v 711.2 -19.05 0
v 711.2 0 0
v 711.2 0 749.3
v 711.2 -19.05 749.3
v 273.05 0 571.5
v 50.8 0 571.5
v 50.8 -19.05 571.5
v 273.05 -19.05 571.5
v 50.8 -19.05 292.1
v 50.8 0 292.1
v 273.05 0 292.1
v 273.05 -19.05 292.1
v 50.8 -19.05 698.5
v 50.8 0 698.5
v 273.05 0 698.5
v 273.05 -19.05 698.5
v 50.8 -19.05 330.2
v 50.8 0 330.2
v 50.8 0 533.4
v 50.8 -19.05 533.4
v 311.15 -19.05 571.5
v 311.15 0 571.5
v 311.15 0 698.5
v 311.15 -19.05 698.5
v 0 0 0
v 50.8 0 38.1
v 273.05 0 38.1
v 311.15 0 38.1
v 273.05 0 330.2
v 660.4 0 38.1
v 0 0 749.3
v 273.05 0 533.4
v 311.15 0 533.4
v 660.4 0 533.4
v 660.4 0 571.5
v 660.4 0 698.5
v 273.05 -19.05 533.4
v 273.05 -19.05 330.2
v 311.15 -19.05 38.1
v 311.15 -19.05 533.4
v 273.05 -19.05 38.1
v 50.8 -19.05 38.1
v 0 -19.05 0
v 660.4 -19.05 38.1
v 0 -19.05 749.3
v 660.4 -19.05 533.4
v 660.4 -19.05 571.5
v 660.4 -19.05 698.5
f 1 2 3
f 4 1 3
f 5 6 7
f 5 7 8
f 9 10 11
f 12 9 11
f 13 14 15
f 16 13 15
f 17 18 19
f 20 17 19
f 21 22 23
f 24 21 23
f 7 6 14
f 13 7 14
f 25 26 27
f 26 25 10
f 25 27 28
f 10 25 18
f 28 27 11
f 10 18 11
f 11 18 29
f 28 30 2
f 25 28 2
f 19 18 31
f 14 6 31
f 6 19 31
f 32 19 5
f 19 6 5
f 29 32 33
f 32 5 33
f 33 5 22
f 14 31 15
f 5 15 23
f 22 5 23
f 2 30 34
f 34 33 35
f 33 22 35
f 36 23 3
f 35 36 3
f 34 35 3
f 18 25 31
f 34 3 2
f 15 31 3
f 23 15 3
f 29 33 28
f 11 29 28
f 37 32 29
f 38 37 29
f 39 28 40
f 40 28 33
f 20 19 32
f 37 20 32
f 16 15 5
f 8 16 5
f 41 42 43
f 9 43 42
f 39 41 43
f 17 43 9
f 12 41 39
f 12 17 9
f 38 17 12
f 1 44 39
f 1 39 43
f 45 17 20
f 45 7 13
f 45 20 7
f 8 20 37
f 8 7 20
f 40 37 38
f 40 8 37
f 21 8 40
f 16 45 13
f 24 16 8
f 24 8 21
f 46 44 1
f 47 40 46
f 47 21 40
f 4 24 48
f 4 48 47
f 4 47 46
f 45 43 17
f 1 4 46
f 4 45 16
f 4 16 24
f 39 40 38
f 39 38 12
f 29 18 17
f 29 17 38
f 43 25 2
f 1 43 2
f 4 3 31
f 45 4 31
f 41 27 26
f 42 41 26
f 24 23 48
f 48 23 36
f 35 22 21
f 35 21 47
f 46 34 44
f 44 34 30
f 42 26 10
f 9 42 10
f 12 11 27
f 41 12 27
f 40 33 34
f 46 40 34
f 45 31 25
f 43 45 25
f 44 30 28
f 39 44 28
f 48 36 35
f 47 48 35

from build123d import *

# Parameters (mm, degrees)
F0_W     = 349.25
F0_H     = 38.1
F0_W_2   = 222.25
F1_DEPTH = 19.05


with BuildPart() as f1:
    # F0 (on Front) → F1 (new body)
    with BuildSketch(Plane.XZ):
        Polygon((0, 749.3), (0, 0), (50.8, 0), (50.8, 38.1), (50.8, 292.1), (50.8, 330.2), (50.8, 533.4), (50.8, 571.5), (50.8, 698.5), (50.8, 749.3), align=None)
        Polygon((660.4, 749.3), (50.8, 749.3), (50.8, 698.5), (273.05, 698.5), (311.15, 698.5), (660.4, 698.5), align=None)
        Polygon((660.4, 38.1), (660.4, 0), (711.2, 0), (711.2, 749.3), (660.4, 749.3), (660.4, 698.5), (660.4, 571.5), (660.4, 533.4), align=None)
        Polygon((273.05, 292.1), (273.05, 38.1), (311.15, 38.1), (311.15, 533.4), (311.15, 571.5), (311.15, 698.5), (273.05, 698.5), (273.05, 571.5), (273.05, 533.4), (273.05, 330.2), align=None)
        with Locations((485.775, 552.45)):
            Rectangle(F0_W, F0_H)
        with Locations((161.925, 552.45)):
            Rectangle(F0_W_2, F0_H)
        with Locations((161.925, 311.15)):
            Rectangle(F0_W_2, F0_H)
        Polygon((50.8, 38.1), (50.8, 0), (660.4, 0), (660.4, 38.1), (311.15, 38.1), (273.05, 38.1), align=None)
    extrude(amount=F1_DEPTH)


solid = f1.part
